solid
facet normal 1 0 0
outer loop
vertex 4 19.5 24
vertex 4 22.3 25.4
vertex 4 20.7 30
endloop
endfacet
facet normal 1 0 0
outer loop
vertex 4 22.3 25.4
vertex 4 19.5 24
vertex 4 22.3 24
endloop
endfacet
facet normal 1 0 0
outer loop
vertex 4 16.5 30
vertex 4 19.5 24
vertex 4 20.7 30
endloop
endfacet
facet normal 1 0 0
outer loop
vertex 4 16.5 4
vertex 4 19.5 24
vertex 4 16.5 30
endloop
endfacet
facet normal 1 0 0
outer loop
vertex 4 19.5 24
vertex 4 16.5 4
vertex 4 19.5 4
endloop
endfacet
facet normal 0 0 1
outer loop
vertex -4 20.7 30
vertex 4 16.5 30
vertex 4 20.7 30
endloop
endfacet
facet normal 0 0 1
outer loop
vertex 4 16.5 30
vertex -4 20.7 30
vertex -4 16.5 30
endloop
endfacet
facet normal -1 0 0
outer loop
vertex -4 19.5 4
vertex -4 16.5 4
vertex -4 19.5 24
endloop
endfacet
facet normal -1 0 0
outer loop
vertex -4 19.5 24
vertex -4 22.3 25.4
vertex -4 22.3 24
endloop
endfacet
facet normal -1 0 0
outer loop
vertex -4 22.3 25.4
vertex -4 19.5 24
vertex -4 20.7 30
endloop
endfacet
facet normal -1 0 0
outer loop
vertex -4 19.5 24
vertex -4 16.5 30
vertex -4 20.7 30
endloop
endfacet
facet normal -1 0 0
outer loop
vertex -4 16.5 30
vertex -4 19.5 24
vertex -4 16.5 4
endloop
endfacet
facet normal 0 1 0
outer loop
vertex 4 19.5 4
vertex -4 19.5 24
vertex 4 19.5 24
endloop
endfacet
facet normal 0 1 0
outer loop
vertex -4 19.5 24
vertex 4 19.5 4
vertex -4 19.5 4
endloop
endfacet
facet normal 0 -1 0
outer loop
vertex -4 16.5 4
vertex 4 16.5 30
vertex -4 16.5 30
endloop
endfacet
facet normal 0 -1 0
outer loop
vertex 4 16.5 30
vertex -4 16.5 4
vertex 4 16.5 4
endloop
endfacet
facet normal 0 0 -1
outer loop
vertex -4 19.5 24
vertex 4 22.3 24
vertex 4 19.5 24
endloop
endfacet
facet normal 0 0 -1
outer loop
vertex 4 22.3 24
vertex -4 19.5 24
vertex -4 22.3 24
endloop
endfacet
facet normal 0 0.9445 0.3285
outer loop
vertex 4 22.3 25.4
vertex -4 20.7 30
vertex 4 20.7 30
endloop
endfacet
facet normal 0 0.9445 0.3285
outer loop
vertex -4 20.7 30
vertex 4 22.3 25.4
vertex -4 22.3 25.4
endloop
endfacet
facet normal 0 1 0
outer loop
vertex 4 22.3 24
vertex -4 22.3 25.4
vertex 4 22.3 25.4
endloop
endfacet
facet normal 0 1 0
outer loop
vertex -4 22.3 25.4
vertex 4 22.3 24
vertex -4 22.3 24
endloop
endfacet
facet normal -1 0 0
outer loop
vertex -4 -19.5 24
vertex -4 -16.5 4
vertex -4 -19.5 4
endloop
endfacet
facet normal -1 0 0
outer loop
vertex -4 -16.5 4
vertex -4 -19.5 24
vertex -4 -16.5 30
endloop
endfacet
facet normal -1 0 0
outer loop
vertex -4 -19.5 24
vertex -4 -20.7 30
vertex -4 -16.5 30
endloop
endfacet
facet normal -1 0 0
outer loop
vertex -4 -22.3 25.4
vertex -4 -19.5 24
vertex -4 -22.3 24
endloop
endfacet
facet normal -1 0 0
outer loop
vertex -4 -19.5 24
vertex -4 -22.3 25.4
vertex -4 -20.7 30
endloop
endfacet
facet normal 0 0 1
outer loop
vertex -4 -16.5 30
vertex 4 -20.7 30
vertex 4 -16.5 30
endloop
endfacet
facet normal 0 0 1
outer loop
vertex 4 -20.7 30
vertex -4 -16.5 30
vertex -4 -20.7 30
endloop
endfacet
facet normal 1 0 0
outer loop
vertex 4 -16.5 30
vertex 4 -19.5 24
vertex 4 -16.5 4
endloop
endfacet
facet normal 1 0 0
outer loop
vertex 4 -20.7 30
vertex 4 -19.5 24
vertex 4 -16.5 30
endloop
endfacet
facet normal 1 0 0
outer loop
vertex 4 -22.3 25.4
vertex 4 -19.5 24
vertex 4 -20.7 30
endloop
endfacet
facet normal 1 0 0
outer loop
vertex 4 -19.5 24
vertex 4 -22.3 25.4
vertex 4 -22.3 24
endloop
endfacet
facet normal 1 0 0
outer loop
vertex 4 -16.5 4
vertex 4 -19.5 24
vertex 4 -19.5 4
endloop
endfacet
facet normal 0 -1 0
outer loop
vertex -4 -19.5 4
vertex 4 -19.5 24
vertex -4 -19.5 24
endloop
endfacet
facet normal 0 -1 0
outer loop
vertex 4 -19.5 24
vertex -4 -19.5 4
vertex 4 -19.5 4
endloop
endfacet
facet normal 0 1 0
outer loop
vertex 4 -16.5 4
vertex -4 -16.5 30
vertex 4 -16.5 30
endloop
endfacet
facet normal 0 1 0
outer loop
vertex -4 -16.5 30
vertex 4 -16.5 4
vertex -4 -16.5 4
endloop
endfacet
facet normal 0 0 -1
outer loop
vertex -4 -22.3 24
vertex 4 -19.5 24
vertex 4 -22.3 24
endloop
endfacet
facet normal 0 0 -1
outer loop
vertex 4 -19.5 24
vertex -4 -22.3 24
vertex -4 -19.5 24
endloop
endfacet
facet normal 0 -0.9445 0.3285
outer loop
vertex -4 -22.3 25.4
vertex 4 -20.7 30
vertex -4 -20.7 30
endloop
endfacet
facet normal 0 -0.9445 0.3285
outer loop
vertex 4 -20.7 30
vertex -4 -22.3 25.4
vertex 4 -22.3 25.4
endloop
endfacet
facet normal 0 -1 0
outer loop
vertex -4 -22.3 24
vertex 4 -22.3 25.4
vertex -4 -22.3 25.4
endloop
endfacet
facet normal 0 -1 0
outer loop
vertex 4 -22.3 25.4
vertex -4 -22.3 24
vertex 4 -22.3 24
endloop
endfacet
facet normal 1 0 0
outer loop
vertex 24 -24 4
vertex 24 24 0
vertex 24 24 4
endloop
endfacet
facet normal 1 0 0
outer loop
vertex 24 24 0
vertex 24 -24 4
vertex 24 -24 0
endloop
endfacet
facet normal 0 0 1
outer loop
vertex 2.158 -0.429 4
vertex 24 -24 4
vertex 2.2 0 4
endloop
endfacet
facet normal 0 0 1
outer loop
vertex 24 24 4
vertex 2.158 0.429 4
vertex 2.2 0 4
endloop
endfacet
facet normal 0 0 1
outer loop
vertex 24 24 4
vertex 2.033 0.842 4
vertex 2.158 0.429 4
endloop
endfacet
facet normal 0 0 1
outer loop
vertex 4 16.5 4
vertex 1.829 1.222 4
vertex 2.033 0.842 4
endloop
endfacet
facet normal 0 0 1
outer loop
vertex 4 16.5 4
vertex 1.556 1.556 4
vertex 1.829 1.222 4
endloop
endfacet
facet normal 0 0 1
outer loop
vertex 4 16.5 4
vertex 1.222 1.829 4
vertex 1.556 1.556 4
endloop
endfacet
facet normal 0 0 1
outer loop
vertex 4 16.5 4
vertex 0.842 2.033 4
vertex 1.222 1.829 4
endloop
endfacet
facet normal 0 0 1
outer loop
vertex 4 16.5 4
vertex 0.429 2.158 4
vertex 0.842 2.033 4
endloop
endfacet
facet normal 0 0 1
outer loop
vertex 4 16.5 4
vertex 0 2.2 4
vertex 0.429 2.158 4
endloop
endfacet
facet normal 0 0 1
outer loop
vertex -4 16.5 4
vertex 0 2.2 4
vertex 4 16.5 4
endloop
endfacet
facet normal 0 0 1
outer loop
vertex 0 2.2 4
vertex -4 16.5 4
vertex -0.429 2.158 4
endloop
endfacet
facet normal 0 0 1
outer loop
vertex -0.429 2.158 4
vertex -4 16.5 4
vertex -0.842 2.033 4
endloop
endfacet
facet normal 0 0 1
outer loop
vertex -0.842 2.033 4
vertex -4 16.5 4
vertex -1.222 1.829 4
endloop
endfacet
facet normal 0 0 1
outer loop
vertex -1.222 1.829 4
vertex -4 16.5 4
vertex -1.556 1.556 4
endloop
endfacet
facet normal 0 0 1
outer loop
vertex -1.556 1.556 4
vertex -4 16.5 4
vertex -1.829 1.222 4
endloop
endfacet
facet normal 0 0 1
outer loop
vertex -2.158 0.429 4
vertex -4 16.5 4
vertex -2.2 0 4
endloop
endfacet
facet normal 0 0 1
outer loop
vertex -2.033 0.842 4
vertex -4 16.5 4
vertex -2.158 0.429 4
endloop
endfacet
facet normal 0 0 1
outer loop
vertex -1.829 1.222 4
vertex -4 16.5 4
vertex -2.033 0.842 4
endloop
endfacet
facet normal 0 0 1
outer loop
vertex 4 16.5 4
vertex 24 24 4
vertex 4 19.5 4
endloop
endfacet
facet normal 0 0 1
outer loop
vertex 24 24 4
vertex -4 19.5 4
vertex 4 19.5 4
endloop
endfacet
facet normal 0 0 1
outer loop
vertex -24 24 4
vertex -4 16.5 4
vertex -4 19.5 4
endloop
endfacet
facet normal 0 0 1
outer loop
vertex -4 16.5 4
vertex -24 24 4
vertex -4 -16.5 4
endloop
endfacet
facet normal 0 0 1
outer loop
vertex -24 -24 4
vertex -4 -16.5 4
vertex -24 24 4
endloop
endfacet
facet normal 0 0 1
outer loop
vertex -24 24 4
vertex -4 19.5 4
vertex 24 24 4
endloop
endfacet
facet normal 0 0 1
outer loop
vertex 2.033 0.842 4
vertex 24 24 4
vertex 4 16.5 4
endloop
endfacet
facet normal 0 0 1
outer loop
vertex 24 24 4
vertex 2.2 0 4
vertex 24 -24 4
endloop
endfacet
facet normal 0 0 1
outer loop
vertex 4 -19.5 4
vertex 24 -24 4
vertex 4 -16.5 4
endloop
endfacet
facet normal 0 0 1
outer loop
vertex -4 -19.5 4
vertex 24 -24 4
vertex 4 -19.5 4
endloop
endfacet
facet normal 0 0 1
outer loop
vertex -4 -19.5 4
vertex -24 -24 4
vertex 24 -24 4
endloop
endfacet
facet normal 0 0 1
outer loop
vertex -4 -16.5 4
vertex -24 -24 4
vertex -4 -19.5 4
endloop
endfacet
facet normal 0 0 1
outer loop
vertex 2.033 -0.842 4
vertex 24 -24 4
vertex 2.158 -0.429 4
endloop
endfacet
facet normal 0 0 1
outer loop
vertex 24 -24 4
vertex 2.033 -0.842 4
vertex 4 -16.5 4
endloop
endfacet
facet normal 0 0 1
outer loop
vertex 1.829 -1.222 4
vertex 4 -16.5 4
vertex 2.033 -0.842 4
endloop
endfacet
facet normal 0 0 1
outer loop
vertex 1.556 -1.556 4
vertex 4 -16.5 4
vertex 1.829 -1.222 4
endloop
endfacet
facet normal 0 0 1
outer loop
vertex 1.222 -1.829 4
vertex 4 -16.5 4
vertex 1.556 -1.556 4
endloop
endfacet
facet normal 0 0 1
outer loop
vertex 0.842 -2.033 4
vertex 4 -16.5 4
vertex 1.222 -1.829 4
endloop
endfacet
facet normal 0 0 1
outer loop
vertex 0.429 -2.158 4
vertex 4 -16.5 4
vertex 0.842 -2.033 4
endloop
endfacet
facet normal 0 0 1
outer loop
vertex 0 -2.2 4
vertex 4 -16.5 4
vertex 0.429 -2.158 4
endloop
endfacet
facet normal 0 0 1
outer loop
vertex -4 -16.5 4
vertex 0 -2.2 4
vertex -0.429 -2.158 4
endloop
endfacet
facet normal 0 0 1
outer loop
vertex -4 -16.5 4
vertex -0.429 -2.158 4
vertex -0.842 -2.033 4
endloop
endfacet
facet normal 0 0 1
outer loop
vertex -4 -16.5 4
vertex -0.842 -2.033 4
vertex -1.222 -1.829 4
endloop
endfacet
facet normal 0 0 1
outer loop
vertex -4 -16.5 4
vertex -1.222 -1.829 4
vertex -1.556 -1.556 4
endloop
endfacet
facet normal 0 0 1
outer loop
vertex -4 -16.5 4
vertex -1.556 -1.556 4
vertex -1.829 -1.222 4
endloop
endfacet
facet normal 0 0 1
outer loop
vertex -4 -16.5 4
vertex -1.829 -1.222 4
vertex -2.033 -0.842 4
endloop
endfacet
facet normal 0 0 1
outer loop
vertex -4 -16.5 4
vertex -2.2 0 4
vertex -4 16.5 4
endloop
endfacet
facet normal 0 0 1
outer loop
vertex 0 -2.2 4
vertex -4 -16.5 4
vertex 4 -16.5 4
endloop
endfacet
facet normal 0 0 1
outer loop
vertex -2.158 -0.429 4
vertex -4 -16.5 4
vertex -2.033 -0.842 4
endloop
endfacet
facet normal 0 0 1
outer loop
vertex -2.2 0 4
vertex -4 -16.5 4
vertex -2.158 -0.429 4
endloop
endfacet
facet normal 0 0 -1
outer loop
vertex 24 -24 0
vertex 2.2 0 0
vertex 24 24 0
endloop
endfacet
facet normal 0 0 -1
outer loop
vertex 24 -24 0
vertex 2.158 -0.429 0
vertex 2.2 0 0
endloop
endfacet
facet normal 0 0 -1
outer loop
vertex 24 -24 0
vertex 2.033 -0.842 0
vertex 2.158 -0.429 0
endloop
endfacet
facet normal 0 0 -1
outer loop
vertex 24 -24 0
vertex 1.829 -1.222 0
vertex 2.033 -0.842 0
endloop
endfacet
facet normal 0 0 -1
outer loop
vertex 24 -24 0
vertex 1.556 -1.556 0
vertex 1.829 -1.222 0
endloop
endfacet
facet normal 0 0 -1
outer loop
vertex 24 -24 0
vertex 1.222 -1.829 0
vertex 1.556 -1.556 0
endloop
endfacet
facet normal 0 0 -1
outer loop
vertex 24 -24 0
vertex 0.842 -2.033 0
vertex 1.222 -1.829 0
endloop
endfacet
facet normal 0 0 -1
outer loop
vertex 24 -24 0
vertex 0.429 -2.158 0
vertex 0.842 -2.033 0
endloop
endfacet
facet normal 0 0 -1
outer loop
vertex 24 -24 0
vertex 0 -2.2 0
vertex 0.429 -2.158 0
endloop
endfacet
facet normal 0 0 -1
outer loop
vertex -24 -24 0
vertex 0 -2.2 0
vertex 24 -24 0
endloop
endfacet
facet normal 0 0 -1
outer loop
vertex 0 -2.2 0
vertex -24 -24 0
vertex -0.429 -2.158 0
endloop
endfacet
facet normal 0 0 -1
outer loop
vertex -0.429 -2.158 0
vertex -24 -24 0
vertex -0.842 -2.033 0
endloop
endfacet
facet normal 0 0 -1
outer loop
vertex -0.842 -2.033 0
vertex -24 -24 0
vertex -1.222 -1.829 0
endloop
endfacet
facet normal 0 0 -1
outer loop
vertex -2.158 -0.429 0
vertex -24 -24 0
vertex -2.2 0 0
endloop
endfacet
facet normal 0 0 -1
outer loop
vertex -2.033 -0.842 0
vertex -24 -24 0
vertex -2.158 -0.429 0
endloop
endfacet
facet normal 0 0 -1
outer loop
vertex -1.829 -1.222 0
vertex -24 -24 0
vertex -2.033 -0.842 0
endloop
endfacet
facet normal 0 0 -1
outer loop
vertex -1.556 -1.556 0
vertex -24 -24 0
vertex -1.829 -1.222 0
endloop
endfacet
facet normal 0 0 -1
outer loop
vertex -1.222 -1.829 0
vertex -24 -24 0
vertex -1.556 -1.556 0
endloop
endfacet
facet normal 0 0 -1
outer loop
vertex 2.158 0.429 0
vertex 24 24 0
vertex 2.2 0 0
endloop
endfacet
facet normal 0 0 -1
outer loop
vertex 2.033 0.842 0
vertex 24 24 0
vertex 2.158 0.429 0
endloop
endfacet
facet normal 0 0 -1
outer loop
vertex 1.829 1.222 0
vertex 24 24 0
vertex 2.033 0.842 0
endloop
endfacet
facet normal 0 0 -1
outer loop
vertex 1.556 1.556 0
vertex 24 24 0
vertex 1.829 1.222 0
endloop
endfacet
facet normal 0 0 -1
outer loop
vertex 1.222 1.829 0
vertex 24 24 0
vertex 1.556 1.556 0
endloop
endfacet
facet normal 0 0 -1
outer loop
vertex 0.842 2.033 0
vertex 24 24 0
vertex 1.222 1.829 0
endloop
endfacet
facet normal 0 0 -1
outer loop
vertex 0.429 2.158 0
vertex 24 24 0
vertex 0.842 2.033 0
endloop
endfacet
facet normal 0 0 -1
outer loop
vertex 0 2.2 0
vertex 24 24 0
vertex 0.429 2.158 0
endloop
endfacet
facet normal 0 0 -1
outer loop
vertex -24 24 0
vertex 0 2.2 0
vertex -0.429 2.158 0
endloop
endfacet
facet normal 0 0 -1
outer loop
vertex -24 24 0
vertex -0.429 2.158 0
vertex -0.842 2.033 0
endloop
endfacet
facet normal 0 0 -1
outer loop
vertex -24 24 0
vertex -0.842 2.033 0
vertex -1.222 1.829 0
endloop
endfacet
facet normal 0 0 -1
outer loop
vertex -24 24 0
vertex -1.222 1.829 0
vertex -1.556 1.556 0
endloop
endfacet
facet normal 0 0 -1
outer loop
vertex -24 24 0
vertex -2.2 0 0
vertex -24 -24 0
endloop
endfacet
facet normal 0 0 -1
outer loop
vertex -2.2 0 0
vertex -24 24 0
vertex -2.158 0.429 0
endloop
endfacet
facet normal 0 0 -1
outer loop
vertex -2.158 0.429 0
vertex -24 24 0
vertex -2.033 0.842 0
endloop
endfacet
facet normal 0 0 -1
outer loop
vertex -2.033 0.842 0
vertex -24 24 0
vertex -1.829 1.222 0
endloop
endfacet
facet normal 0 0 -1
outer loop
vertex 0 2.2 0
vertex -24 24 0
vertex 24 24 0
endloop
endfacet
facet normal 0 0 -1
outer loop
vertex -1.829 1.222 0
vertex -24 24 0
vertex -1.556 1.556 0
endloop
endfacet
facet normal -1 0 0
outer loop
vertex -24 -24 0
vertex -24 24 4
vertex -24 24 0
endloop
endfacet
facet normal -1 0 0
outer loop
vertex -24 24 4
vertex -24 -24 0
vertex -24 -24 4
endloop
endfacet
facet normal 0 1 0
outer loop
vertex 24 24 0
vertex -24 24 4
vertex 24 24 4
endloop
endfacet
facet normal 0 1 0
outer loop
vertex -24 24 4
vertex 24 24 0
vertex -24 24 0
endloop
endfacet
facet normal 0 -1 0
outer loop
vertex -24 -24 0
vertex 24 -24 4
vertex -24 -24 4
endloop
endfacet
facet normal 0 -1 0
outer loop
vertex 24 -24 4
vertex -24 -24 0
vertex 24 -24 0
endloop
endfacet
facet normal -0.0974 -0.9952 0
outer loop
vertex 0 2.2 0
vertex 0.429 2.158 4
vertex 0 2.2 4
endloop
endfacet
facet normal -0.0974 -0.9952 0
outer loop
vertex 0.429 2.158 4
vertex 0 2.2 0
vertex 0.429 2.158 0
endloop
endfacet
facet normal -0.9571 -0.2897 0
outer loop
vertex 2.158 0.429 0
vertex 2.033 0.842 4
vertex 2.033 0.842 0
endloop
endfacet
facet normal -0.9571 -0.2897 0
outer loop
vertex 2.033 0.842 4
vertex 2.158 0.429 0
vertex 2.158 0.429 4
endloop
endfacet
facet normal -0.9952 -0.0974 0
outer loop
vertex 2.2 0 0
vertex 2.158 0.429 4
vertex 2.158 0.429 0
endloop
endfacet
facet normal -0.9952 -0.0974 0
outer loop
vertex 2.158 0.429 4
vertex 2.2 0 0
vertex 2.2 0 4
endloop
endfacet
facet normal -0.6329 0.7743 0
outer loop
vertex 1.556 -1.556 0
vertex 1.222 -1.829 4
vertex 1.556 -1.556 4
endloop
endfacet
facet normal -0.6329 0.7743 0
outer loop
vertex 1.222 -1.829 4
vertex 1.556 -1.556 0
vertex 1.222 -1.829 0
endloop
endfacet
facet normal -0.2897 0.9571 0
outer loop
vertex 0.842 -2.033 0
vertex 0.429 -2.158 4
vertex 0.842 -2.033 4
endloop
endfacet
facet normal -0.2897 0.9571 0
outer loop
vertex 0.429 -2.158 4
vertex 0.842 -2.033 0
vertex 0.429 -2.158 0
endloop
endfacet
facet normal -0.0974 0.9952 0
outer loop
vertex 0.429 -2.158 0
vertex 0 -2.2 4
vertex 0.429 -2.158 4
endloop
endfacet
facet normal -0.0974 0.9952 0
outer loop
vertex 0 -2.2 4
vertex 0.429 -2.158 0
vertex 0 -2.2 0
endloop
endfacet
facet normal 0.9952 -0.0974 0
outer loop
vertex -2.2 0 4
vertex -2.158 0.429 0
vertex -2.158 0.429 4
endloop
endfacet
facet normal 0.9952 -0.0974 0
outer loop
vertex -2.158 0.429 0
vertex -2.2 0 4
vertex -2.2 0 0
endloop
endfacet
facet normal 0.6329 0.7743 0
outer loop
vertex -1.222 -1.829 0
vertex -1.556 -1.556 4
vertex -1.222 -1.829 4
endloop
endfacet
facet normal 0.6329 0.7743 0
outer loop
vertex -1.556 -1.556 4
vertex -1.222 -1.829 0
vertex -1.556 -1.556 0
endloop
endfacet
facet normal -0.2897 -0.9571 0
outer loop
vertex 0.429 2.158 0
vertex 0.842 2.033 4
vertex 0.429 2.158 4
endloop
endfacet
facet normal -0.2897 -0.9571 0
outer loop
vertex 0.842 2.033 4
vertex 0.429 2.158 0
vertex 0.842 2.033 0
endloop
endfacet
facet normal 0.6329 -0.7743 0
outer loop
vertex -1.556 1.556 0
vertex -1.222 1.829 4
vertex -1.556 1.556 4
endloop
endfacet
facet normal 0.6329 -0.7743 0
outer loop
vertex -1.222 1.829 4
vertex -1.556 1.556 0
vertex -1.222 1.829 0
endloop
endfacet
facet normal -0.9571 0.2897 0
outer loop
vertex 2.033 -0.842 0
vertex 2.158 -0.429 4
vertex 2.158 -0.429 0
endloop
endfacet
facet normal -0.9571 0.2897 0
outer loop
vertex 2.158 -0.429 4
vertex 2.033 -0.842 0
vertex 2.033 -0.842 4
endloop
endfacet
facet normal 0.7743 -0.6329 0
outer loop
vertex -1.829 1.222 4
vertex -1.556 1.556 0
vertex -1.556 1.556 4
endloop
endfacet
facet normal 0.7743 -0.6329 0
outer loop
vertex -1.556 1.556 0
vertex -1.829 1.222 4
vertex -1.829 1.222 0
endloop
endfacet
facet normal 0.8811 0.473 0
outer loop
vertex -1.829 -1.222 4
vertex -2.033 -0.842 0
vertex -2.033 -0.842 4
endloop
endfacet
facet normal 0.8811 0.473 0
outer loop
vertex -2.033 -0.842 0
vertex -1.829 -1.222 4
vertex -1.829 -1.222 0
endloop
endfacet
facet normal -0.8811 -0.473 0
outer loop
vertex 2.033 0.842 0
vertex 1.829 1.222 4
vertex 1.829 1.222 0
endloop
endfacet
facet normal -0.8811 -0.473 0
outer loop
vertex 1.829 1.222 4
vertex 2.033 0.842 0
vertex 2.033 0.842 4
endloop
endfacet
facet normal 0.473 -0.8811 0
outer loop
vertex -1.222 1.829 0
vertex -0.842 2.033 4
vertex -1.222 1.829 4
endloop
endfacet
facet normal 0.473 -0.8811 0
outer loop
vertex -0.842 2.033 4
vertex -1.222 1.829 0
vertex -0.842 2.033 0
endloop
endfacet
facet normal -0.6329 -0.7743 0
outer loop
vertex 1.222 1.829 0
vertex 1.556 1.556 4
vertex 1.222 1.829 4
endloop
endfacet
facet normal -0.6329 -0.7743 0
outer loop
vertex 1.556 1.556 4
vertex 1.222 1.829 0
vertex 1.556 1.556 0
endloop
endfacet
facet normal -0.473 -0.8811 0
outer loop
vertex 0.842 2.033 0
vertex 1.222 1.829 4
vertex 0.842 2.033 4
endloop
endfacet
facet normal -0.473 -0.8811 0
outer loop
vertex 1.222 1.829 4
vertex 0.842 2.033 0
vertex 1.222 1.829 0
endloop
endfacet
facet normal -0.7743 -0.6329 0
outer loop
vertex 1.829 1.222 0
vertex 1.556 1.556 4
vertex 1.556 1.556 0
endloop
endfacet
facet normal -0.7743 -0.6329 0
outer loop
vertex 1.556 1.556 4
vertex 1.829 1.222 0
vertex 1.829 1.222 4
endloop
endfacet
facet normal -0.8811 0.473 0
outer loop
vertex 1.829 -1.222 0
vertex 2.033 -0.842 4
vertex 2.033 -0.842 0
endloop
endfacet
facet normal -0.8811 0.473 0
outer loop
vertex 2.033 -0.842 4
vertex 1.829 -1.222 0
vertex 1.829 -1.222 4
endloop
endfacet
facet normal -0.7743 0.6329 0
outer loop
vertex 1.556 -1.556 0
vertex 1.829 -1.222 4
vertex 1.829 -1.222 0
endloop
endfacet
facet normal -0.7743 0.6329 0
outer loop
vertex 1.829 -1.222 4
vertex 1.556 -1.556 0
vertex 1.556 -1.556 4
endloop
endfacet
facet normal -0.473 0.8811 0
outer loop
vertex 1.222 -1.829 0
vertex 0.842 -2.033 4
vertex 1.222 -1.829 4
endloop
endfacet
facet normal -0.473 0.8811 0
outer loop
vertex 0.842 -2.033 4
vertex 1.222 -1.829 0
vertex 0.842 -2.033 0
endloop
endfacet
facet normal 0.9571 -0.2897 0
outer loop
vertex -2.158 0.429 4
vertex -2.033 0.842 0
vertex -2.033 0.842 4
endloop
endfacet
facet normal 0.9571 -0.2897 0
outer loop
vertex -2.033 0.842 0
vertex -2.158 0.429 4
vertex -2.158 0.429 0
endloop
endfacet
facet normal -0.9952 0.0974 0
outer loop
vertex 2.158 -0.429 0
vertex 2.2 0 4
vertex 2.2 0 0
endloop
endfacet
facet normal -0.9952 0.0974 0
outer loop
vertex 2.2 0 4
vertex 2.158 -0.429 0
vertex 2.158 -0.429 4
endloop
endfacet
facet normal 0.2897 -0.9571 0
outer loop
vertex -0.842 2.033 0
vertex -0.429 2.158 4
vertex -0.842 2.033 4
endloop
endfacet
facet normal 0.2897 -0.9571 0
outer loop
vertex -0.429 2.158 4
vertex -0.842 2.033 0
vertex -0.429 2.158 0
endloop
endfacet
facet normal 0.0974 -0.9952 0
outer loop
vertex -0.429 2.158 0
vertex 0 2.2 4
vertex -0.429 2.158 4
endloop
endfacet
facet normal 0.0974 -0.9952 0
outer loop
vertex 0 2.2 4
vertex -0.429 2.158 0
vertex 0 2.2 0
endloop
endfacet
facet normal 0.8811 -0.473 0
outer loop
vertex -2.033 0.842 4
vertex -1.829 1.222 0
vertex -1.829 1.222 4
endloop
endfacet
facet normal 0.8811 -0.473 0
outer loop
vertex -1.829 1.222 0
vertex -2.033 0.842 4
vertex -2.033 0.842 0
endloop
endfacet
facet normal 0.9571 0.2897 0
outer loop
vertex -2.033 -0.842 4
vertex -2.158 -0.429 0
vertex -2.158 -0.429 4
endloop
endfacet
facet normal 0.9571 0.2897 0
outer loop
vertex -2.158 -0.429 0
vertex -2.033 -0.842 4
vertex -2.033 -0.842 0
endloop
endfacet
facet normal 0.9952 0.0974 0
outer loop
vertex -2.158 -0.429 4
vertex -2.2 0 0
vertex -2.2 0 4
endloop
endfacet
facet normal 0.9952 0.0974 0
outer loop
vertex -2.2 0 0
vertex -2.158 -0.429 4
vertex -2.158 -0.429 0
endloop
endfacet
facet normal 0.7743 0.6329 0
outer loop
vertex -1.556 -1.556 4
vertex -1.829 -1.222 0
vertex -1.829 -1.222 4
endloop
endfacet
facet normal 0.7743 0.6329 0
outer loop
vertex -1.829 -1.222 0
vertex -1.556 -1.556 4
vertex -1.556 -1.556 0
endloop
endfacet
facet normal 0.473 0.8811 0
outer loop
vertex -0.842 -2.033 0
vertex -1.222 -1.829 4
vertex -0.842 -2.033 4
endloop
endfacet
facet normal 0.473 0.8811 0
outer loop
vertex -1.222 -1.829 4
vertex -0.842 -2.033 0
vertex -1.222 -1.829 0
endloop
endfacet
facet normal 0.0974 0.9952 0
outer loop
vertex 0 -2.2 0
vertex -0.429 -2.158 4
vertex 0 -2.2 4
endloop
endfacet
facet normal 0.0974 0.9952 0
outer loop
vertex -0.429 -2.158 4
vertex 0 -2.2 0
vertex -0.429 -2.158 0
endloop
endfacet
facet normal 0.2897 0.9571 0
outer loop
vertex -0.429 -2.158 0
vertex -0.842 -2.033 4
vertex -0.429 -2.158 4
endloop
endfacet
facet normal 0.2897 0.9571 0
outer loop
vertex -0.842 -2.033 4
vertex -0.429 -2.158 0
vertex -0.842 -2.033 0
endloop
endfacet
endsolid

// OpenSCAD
$fn = 32;

// ----------------------------------------------------------------------
// Snap-fit latch: 2 arms, 26 mm tall, 3 mm undercut hooks
// ----------------------------------------------------------------------

// --- parameters (mm) ---
base_d = 48;              // base plate depth
base_h = 4;               // base plate thickness
span = 36;                // distance between opposite arms
arm_t = 3;                // arm thickness
arm_d = 8;                // arm width
height = 26;              // free arm length
head_len = 3;             // hook reach
head_h = 6;               // hook height
lead = 1.4;               // lead-in ramp thickness
bore_d = 4.4;             // base fixing bore
top_z = 30;               // height of the arm tips above the base

arms = 2;

difference() {
  union() {
    /* base plate, centred on the arm ring */
    translate([-24, -24, 0]) cube([base_d, base_d, base_h]);
    for (a = [0 : 360 / arms : 359]) rotate([0, 0, a]) {
    /* arm, sunk 0.5 mm into the base */
    translate([-arm_d / 2, span / 2 - arm_t / 2, base_h - 0.5]) cube([arm_d, arm_t, height + 0.5]);
    /* hook: a convex hull of a tall inner block and a thin outer lip
       gives a flat undercut below and a lead-in ramp on top */
    hull() {
      translate([-arm_d / 2, span / 2 + arm_t / 2 - 0.6, top_z - head_h]) cube([arm_d, lead + 0.4, head_h]);
      translate([-arm_d / 2, span / 2 + arm_t / 2 - 0.2, top_z - head_h]) cube([arm_d, head_len, lead]);
    }
    }
  }
  translate([0, 0, -2.5]) cylinder(h = base_h + 5, d = bore_d);
}
